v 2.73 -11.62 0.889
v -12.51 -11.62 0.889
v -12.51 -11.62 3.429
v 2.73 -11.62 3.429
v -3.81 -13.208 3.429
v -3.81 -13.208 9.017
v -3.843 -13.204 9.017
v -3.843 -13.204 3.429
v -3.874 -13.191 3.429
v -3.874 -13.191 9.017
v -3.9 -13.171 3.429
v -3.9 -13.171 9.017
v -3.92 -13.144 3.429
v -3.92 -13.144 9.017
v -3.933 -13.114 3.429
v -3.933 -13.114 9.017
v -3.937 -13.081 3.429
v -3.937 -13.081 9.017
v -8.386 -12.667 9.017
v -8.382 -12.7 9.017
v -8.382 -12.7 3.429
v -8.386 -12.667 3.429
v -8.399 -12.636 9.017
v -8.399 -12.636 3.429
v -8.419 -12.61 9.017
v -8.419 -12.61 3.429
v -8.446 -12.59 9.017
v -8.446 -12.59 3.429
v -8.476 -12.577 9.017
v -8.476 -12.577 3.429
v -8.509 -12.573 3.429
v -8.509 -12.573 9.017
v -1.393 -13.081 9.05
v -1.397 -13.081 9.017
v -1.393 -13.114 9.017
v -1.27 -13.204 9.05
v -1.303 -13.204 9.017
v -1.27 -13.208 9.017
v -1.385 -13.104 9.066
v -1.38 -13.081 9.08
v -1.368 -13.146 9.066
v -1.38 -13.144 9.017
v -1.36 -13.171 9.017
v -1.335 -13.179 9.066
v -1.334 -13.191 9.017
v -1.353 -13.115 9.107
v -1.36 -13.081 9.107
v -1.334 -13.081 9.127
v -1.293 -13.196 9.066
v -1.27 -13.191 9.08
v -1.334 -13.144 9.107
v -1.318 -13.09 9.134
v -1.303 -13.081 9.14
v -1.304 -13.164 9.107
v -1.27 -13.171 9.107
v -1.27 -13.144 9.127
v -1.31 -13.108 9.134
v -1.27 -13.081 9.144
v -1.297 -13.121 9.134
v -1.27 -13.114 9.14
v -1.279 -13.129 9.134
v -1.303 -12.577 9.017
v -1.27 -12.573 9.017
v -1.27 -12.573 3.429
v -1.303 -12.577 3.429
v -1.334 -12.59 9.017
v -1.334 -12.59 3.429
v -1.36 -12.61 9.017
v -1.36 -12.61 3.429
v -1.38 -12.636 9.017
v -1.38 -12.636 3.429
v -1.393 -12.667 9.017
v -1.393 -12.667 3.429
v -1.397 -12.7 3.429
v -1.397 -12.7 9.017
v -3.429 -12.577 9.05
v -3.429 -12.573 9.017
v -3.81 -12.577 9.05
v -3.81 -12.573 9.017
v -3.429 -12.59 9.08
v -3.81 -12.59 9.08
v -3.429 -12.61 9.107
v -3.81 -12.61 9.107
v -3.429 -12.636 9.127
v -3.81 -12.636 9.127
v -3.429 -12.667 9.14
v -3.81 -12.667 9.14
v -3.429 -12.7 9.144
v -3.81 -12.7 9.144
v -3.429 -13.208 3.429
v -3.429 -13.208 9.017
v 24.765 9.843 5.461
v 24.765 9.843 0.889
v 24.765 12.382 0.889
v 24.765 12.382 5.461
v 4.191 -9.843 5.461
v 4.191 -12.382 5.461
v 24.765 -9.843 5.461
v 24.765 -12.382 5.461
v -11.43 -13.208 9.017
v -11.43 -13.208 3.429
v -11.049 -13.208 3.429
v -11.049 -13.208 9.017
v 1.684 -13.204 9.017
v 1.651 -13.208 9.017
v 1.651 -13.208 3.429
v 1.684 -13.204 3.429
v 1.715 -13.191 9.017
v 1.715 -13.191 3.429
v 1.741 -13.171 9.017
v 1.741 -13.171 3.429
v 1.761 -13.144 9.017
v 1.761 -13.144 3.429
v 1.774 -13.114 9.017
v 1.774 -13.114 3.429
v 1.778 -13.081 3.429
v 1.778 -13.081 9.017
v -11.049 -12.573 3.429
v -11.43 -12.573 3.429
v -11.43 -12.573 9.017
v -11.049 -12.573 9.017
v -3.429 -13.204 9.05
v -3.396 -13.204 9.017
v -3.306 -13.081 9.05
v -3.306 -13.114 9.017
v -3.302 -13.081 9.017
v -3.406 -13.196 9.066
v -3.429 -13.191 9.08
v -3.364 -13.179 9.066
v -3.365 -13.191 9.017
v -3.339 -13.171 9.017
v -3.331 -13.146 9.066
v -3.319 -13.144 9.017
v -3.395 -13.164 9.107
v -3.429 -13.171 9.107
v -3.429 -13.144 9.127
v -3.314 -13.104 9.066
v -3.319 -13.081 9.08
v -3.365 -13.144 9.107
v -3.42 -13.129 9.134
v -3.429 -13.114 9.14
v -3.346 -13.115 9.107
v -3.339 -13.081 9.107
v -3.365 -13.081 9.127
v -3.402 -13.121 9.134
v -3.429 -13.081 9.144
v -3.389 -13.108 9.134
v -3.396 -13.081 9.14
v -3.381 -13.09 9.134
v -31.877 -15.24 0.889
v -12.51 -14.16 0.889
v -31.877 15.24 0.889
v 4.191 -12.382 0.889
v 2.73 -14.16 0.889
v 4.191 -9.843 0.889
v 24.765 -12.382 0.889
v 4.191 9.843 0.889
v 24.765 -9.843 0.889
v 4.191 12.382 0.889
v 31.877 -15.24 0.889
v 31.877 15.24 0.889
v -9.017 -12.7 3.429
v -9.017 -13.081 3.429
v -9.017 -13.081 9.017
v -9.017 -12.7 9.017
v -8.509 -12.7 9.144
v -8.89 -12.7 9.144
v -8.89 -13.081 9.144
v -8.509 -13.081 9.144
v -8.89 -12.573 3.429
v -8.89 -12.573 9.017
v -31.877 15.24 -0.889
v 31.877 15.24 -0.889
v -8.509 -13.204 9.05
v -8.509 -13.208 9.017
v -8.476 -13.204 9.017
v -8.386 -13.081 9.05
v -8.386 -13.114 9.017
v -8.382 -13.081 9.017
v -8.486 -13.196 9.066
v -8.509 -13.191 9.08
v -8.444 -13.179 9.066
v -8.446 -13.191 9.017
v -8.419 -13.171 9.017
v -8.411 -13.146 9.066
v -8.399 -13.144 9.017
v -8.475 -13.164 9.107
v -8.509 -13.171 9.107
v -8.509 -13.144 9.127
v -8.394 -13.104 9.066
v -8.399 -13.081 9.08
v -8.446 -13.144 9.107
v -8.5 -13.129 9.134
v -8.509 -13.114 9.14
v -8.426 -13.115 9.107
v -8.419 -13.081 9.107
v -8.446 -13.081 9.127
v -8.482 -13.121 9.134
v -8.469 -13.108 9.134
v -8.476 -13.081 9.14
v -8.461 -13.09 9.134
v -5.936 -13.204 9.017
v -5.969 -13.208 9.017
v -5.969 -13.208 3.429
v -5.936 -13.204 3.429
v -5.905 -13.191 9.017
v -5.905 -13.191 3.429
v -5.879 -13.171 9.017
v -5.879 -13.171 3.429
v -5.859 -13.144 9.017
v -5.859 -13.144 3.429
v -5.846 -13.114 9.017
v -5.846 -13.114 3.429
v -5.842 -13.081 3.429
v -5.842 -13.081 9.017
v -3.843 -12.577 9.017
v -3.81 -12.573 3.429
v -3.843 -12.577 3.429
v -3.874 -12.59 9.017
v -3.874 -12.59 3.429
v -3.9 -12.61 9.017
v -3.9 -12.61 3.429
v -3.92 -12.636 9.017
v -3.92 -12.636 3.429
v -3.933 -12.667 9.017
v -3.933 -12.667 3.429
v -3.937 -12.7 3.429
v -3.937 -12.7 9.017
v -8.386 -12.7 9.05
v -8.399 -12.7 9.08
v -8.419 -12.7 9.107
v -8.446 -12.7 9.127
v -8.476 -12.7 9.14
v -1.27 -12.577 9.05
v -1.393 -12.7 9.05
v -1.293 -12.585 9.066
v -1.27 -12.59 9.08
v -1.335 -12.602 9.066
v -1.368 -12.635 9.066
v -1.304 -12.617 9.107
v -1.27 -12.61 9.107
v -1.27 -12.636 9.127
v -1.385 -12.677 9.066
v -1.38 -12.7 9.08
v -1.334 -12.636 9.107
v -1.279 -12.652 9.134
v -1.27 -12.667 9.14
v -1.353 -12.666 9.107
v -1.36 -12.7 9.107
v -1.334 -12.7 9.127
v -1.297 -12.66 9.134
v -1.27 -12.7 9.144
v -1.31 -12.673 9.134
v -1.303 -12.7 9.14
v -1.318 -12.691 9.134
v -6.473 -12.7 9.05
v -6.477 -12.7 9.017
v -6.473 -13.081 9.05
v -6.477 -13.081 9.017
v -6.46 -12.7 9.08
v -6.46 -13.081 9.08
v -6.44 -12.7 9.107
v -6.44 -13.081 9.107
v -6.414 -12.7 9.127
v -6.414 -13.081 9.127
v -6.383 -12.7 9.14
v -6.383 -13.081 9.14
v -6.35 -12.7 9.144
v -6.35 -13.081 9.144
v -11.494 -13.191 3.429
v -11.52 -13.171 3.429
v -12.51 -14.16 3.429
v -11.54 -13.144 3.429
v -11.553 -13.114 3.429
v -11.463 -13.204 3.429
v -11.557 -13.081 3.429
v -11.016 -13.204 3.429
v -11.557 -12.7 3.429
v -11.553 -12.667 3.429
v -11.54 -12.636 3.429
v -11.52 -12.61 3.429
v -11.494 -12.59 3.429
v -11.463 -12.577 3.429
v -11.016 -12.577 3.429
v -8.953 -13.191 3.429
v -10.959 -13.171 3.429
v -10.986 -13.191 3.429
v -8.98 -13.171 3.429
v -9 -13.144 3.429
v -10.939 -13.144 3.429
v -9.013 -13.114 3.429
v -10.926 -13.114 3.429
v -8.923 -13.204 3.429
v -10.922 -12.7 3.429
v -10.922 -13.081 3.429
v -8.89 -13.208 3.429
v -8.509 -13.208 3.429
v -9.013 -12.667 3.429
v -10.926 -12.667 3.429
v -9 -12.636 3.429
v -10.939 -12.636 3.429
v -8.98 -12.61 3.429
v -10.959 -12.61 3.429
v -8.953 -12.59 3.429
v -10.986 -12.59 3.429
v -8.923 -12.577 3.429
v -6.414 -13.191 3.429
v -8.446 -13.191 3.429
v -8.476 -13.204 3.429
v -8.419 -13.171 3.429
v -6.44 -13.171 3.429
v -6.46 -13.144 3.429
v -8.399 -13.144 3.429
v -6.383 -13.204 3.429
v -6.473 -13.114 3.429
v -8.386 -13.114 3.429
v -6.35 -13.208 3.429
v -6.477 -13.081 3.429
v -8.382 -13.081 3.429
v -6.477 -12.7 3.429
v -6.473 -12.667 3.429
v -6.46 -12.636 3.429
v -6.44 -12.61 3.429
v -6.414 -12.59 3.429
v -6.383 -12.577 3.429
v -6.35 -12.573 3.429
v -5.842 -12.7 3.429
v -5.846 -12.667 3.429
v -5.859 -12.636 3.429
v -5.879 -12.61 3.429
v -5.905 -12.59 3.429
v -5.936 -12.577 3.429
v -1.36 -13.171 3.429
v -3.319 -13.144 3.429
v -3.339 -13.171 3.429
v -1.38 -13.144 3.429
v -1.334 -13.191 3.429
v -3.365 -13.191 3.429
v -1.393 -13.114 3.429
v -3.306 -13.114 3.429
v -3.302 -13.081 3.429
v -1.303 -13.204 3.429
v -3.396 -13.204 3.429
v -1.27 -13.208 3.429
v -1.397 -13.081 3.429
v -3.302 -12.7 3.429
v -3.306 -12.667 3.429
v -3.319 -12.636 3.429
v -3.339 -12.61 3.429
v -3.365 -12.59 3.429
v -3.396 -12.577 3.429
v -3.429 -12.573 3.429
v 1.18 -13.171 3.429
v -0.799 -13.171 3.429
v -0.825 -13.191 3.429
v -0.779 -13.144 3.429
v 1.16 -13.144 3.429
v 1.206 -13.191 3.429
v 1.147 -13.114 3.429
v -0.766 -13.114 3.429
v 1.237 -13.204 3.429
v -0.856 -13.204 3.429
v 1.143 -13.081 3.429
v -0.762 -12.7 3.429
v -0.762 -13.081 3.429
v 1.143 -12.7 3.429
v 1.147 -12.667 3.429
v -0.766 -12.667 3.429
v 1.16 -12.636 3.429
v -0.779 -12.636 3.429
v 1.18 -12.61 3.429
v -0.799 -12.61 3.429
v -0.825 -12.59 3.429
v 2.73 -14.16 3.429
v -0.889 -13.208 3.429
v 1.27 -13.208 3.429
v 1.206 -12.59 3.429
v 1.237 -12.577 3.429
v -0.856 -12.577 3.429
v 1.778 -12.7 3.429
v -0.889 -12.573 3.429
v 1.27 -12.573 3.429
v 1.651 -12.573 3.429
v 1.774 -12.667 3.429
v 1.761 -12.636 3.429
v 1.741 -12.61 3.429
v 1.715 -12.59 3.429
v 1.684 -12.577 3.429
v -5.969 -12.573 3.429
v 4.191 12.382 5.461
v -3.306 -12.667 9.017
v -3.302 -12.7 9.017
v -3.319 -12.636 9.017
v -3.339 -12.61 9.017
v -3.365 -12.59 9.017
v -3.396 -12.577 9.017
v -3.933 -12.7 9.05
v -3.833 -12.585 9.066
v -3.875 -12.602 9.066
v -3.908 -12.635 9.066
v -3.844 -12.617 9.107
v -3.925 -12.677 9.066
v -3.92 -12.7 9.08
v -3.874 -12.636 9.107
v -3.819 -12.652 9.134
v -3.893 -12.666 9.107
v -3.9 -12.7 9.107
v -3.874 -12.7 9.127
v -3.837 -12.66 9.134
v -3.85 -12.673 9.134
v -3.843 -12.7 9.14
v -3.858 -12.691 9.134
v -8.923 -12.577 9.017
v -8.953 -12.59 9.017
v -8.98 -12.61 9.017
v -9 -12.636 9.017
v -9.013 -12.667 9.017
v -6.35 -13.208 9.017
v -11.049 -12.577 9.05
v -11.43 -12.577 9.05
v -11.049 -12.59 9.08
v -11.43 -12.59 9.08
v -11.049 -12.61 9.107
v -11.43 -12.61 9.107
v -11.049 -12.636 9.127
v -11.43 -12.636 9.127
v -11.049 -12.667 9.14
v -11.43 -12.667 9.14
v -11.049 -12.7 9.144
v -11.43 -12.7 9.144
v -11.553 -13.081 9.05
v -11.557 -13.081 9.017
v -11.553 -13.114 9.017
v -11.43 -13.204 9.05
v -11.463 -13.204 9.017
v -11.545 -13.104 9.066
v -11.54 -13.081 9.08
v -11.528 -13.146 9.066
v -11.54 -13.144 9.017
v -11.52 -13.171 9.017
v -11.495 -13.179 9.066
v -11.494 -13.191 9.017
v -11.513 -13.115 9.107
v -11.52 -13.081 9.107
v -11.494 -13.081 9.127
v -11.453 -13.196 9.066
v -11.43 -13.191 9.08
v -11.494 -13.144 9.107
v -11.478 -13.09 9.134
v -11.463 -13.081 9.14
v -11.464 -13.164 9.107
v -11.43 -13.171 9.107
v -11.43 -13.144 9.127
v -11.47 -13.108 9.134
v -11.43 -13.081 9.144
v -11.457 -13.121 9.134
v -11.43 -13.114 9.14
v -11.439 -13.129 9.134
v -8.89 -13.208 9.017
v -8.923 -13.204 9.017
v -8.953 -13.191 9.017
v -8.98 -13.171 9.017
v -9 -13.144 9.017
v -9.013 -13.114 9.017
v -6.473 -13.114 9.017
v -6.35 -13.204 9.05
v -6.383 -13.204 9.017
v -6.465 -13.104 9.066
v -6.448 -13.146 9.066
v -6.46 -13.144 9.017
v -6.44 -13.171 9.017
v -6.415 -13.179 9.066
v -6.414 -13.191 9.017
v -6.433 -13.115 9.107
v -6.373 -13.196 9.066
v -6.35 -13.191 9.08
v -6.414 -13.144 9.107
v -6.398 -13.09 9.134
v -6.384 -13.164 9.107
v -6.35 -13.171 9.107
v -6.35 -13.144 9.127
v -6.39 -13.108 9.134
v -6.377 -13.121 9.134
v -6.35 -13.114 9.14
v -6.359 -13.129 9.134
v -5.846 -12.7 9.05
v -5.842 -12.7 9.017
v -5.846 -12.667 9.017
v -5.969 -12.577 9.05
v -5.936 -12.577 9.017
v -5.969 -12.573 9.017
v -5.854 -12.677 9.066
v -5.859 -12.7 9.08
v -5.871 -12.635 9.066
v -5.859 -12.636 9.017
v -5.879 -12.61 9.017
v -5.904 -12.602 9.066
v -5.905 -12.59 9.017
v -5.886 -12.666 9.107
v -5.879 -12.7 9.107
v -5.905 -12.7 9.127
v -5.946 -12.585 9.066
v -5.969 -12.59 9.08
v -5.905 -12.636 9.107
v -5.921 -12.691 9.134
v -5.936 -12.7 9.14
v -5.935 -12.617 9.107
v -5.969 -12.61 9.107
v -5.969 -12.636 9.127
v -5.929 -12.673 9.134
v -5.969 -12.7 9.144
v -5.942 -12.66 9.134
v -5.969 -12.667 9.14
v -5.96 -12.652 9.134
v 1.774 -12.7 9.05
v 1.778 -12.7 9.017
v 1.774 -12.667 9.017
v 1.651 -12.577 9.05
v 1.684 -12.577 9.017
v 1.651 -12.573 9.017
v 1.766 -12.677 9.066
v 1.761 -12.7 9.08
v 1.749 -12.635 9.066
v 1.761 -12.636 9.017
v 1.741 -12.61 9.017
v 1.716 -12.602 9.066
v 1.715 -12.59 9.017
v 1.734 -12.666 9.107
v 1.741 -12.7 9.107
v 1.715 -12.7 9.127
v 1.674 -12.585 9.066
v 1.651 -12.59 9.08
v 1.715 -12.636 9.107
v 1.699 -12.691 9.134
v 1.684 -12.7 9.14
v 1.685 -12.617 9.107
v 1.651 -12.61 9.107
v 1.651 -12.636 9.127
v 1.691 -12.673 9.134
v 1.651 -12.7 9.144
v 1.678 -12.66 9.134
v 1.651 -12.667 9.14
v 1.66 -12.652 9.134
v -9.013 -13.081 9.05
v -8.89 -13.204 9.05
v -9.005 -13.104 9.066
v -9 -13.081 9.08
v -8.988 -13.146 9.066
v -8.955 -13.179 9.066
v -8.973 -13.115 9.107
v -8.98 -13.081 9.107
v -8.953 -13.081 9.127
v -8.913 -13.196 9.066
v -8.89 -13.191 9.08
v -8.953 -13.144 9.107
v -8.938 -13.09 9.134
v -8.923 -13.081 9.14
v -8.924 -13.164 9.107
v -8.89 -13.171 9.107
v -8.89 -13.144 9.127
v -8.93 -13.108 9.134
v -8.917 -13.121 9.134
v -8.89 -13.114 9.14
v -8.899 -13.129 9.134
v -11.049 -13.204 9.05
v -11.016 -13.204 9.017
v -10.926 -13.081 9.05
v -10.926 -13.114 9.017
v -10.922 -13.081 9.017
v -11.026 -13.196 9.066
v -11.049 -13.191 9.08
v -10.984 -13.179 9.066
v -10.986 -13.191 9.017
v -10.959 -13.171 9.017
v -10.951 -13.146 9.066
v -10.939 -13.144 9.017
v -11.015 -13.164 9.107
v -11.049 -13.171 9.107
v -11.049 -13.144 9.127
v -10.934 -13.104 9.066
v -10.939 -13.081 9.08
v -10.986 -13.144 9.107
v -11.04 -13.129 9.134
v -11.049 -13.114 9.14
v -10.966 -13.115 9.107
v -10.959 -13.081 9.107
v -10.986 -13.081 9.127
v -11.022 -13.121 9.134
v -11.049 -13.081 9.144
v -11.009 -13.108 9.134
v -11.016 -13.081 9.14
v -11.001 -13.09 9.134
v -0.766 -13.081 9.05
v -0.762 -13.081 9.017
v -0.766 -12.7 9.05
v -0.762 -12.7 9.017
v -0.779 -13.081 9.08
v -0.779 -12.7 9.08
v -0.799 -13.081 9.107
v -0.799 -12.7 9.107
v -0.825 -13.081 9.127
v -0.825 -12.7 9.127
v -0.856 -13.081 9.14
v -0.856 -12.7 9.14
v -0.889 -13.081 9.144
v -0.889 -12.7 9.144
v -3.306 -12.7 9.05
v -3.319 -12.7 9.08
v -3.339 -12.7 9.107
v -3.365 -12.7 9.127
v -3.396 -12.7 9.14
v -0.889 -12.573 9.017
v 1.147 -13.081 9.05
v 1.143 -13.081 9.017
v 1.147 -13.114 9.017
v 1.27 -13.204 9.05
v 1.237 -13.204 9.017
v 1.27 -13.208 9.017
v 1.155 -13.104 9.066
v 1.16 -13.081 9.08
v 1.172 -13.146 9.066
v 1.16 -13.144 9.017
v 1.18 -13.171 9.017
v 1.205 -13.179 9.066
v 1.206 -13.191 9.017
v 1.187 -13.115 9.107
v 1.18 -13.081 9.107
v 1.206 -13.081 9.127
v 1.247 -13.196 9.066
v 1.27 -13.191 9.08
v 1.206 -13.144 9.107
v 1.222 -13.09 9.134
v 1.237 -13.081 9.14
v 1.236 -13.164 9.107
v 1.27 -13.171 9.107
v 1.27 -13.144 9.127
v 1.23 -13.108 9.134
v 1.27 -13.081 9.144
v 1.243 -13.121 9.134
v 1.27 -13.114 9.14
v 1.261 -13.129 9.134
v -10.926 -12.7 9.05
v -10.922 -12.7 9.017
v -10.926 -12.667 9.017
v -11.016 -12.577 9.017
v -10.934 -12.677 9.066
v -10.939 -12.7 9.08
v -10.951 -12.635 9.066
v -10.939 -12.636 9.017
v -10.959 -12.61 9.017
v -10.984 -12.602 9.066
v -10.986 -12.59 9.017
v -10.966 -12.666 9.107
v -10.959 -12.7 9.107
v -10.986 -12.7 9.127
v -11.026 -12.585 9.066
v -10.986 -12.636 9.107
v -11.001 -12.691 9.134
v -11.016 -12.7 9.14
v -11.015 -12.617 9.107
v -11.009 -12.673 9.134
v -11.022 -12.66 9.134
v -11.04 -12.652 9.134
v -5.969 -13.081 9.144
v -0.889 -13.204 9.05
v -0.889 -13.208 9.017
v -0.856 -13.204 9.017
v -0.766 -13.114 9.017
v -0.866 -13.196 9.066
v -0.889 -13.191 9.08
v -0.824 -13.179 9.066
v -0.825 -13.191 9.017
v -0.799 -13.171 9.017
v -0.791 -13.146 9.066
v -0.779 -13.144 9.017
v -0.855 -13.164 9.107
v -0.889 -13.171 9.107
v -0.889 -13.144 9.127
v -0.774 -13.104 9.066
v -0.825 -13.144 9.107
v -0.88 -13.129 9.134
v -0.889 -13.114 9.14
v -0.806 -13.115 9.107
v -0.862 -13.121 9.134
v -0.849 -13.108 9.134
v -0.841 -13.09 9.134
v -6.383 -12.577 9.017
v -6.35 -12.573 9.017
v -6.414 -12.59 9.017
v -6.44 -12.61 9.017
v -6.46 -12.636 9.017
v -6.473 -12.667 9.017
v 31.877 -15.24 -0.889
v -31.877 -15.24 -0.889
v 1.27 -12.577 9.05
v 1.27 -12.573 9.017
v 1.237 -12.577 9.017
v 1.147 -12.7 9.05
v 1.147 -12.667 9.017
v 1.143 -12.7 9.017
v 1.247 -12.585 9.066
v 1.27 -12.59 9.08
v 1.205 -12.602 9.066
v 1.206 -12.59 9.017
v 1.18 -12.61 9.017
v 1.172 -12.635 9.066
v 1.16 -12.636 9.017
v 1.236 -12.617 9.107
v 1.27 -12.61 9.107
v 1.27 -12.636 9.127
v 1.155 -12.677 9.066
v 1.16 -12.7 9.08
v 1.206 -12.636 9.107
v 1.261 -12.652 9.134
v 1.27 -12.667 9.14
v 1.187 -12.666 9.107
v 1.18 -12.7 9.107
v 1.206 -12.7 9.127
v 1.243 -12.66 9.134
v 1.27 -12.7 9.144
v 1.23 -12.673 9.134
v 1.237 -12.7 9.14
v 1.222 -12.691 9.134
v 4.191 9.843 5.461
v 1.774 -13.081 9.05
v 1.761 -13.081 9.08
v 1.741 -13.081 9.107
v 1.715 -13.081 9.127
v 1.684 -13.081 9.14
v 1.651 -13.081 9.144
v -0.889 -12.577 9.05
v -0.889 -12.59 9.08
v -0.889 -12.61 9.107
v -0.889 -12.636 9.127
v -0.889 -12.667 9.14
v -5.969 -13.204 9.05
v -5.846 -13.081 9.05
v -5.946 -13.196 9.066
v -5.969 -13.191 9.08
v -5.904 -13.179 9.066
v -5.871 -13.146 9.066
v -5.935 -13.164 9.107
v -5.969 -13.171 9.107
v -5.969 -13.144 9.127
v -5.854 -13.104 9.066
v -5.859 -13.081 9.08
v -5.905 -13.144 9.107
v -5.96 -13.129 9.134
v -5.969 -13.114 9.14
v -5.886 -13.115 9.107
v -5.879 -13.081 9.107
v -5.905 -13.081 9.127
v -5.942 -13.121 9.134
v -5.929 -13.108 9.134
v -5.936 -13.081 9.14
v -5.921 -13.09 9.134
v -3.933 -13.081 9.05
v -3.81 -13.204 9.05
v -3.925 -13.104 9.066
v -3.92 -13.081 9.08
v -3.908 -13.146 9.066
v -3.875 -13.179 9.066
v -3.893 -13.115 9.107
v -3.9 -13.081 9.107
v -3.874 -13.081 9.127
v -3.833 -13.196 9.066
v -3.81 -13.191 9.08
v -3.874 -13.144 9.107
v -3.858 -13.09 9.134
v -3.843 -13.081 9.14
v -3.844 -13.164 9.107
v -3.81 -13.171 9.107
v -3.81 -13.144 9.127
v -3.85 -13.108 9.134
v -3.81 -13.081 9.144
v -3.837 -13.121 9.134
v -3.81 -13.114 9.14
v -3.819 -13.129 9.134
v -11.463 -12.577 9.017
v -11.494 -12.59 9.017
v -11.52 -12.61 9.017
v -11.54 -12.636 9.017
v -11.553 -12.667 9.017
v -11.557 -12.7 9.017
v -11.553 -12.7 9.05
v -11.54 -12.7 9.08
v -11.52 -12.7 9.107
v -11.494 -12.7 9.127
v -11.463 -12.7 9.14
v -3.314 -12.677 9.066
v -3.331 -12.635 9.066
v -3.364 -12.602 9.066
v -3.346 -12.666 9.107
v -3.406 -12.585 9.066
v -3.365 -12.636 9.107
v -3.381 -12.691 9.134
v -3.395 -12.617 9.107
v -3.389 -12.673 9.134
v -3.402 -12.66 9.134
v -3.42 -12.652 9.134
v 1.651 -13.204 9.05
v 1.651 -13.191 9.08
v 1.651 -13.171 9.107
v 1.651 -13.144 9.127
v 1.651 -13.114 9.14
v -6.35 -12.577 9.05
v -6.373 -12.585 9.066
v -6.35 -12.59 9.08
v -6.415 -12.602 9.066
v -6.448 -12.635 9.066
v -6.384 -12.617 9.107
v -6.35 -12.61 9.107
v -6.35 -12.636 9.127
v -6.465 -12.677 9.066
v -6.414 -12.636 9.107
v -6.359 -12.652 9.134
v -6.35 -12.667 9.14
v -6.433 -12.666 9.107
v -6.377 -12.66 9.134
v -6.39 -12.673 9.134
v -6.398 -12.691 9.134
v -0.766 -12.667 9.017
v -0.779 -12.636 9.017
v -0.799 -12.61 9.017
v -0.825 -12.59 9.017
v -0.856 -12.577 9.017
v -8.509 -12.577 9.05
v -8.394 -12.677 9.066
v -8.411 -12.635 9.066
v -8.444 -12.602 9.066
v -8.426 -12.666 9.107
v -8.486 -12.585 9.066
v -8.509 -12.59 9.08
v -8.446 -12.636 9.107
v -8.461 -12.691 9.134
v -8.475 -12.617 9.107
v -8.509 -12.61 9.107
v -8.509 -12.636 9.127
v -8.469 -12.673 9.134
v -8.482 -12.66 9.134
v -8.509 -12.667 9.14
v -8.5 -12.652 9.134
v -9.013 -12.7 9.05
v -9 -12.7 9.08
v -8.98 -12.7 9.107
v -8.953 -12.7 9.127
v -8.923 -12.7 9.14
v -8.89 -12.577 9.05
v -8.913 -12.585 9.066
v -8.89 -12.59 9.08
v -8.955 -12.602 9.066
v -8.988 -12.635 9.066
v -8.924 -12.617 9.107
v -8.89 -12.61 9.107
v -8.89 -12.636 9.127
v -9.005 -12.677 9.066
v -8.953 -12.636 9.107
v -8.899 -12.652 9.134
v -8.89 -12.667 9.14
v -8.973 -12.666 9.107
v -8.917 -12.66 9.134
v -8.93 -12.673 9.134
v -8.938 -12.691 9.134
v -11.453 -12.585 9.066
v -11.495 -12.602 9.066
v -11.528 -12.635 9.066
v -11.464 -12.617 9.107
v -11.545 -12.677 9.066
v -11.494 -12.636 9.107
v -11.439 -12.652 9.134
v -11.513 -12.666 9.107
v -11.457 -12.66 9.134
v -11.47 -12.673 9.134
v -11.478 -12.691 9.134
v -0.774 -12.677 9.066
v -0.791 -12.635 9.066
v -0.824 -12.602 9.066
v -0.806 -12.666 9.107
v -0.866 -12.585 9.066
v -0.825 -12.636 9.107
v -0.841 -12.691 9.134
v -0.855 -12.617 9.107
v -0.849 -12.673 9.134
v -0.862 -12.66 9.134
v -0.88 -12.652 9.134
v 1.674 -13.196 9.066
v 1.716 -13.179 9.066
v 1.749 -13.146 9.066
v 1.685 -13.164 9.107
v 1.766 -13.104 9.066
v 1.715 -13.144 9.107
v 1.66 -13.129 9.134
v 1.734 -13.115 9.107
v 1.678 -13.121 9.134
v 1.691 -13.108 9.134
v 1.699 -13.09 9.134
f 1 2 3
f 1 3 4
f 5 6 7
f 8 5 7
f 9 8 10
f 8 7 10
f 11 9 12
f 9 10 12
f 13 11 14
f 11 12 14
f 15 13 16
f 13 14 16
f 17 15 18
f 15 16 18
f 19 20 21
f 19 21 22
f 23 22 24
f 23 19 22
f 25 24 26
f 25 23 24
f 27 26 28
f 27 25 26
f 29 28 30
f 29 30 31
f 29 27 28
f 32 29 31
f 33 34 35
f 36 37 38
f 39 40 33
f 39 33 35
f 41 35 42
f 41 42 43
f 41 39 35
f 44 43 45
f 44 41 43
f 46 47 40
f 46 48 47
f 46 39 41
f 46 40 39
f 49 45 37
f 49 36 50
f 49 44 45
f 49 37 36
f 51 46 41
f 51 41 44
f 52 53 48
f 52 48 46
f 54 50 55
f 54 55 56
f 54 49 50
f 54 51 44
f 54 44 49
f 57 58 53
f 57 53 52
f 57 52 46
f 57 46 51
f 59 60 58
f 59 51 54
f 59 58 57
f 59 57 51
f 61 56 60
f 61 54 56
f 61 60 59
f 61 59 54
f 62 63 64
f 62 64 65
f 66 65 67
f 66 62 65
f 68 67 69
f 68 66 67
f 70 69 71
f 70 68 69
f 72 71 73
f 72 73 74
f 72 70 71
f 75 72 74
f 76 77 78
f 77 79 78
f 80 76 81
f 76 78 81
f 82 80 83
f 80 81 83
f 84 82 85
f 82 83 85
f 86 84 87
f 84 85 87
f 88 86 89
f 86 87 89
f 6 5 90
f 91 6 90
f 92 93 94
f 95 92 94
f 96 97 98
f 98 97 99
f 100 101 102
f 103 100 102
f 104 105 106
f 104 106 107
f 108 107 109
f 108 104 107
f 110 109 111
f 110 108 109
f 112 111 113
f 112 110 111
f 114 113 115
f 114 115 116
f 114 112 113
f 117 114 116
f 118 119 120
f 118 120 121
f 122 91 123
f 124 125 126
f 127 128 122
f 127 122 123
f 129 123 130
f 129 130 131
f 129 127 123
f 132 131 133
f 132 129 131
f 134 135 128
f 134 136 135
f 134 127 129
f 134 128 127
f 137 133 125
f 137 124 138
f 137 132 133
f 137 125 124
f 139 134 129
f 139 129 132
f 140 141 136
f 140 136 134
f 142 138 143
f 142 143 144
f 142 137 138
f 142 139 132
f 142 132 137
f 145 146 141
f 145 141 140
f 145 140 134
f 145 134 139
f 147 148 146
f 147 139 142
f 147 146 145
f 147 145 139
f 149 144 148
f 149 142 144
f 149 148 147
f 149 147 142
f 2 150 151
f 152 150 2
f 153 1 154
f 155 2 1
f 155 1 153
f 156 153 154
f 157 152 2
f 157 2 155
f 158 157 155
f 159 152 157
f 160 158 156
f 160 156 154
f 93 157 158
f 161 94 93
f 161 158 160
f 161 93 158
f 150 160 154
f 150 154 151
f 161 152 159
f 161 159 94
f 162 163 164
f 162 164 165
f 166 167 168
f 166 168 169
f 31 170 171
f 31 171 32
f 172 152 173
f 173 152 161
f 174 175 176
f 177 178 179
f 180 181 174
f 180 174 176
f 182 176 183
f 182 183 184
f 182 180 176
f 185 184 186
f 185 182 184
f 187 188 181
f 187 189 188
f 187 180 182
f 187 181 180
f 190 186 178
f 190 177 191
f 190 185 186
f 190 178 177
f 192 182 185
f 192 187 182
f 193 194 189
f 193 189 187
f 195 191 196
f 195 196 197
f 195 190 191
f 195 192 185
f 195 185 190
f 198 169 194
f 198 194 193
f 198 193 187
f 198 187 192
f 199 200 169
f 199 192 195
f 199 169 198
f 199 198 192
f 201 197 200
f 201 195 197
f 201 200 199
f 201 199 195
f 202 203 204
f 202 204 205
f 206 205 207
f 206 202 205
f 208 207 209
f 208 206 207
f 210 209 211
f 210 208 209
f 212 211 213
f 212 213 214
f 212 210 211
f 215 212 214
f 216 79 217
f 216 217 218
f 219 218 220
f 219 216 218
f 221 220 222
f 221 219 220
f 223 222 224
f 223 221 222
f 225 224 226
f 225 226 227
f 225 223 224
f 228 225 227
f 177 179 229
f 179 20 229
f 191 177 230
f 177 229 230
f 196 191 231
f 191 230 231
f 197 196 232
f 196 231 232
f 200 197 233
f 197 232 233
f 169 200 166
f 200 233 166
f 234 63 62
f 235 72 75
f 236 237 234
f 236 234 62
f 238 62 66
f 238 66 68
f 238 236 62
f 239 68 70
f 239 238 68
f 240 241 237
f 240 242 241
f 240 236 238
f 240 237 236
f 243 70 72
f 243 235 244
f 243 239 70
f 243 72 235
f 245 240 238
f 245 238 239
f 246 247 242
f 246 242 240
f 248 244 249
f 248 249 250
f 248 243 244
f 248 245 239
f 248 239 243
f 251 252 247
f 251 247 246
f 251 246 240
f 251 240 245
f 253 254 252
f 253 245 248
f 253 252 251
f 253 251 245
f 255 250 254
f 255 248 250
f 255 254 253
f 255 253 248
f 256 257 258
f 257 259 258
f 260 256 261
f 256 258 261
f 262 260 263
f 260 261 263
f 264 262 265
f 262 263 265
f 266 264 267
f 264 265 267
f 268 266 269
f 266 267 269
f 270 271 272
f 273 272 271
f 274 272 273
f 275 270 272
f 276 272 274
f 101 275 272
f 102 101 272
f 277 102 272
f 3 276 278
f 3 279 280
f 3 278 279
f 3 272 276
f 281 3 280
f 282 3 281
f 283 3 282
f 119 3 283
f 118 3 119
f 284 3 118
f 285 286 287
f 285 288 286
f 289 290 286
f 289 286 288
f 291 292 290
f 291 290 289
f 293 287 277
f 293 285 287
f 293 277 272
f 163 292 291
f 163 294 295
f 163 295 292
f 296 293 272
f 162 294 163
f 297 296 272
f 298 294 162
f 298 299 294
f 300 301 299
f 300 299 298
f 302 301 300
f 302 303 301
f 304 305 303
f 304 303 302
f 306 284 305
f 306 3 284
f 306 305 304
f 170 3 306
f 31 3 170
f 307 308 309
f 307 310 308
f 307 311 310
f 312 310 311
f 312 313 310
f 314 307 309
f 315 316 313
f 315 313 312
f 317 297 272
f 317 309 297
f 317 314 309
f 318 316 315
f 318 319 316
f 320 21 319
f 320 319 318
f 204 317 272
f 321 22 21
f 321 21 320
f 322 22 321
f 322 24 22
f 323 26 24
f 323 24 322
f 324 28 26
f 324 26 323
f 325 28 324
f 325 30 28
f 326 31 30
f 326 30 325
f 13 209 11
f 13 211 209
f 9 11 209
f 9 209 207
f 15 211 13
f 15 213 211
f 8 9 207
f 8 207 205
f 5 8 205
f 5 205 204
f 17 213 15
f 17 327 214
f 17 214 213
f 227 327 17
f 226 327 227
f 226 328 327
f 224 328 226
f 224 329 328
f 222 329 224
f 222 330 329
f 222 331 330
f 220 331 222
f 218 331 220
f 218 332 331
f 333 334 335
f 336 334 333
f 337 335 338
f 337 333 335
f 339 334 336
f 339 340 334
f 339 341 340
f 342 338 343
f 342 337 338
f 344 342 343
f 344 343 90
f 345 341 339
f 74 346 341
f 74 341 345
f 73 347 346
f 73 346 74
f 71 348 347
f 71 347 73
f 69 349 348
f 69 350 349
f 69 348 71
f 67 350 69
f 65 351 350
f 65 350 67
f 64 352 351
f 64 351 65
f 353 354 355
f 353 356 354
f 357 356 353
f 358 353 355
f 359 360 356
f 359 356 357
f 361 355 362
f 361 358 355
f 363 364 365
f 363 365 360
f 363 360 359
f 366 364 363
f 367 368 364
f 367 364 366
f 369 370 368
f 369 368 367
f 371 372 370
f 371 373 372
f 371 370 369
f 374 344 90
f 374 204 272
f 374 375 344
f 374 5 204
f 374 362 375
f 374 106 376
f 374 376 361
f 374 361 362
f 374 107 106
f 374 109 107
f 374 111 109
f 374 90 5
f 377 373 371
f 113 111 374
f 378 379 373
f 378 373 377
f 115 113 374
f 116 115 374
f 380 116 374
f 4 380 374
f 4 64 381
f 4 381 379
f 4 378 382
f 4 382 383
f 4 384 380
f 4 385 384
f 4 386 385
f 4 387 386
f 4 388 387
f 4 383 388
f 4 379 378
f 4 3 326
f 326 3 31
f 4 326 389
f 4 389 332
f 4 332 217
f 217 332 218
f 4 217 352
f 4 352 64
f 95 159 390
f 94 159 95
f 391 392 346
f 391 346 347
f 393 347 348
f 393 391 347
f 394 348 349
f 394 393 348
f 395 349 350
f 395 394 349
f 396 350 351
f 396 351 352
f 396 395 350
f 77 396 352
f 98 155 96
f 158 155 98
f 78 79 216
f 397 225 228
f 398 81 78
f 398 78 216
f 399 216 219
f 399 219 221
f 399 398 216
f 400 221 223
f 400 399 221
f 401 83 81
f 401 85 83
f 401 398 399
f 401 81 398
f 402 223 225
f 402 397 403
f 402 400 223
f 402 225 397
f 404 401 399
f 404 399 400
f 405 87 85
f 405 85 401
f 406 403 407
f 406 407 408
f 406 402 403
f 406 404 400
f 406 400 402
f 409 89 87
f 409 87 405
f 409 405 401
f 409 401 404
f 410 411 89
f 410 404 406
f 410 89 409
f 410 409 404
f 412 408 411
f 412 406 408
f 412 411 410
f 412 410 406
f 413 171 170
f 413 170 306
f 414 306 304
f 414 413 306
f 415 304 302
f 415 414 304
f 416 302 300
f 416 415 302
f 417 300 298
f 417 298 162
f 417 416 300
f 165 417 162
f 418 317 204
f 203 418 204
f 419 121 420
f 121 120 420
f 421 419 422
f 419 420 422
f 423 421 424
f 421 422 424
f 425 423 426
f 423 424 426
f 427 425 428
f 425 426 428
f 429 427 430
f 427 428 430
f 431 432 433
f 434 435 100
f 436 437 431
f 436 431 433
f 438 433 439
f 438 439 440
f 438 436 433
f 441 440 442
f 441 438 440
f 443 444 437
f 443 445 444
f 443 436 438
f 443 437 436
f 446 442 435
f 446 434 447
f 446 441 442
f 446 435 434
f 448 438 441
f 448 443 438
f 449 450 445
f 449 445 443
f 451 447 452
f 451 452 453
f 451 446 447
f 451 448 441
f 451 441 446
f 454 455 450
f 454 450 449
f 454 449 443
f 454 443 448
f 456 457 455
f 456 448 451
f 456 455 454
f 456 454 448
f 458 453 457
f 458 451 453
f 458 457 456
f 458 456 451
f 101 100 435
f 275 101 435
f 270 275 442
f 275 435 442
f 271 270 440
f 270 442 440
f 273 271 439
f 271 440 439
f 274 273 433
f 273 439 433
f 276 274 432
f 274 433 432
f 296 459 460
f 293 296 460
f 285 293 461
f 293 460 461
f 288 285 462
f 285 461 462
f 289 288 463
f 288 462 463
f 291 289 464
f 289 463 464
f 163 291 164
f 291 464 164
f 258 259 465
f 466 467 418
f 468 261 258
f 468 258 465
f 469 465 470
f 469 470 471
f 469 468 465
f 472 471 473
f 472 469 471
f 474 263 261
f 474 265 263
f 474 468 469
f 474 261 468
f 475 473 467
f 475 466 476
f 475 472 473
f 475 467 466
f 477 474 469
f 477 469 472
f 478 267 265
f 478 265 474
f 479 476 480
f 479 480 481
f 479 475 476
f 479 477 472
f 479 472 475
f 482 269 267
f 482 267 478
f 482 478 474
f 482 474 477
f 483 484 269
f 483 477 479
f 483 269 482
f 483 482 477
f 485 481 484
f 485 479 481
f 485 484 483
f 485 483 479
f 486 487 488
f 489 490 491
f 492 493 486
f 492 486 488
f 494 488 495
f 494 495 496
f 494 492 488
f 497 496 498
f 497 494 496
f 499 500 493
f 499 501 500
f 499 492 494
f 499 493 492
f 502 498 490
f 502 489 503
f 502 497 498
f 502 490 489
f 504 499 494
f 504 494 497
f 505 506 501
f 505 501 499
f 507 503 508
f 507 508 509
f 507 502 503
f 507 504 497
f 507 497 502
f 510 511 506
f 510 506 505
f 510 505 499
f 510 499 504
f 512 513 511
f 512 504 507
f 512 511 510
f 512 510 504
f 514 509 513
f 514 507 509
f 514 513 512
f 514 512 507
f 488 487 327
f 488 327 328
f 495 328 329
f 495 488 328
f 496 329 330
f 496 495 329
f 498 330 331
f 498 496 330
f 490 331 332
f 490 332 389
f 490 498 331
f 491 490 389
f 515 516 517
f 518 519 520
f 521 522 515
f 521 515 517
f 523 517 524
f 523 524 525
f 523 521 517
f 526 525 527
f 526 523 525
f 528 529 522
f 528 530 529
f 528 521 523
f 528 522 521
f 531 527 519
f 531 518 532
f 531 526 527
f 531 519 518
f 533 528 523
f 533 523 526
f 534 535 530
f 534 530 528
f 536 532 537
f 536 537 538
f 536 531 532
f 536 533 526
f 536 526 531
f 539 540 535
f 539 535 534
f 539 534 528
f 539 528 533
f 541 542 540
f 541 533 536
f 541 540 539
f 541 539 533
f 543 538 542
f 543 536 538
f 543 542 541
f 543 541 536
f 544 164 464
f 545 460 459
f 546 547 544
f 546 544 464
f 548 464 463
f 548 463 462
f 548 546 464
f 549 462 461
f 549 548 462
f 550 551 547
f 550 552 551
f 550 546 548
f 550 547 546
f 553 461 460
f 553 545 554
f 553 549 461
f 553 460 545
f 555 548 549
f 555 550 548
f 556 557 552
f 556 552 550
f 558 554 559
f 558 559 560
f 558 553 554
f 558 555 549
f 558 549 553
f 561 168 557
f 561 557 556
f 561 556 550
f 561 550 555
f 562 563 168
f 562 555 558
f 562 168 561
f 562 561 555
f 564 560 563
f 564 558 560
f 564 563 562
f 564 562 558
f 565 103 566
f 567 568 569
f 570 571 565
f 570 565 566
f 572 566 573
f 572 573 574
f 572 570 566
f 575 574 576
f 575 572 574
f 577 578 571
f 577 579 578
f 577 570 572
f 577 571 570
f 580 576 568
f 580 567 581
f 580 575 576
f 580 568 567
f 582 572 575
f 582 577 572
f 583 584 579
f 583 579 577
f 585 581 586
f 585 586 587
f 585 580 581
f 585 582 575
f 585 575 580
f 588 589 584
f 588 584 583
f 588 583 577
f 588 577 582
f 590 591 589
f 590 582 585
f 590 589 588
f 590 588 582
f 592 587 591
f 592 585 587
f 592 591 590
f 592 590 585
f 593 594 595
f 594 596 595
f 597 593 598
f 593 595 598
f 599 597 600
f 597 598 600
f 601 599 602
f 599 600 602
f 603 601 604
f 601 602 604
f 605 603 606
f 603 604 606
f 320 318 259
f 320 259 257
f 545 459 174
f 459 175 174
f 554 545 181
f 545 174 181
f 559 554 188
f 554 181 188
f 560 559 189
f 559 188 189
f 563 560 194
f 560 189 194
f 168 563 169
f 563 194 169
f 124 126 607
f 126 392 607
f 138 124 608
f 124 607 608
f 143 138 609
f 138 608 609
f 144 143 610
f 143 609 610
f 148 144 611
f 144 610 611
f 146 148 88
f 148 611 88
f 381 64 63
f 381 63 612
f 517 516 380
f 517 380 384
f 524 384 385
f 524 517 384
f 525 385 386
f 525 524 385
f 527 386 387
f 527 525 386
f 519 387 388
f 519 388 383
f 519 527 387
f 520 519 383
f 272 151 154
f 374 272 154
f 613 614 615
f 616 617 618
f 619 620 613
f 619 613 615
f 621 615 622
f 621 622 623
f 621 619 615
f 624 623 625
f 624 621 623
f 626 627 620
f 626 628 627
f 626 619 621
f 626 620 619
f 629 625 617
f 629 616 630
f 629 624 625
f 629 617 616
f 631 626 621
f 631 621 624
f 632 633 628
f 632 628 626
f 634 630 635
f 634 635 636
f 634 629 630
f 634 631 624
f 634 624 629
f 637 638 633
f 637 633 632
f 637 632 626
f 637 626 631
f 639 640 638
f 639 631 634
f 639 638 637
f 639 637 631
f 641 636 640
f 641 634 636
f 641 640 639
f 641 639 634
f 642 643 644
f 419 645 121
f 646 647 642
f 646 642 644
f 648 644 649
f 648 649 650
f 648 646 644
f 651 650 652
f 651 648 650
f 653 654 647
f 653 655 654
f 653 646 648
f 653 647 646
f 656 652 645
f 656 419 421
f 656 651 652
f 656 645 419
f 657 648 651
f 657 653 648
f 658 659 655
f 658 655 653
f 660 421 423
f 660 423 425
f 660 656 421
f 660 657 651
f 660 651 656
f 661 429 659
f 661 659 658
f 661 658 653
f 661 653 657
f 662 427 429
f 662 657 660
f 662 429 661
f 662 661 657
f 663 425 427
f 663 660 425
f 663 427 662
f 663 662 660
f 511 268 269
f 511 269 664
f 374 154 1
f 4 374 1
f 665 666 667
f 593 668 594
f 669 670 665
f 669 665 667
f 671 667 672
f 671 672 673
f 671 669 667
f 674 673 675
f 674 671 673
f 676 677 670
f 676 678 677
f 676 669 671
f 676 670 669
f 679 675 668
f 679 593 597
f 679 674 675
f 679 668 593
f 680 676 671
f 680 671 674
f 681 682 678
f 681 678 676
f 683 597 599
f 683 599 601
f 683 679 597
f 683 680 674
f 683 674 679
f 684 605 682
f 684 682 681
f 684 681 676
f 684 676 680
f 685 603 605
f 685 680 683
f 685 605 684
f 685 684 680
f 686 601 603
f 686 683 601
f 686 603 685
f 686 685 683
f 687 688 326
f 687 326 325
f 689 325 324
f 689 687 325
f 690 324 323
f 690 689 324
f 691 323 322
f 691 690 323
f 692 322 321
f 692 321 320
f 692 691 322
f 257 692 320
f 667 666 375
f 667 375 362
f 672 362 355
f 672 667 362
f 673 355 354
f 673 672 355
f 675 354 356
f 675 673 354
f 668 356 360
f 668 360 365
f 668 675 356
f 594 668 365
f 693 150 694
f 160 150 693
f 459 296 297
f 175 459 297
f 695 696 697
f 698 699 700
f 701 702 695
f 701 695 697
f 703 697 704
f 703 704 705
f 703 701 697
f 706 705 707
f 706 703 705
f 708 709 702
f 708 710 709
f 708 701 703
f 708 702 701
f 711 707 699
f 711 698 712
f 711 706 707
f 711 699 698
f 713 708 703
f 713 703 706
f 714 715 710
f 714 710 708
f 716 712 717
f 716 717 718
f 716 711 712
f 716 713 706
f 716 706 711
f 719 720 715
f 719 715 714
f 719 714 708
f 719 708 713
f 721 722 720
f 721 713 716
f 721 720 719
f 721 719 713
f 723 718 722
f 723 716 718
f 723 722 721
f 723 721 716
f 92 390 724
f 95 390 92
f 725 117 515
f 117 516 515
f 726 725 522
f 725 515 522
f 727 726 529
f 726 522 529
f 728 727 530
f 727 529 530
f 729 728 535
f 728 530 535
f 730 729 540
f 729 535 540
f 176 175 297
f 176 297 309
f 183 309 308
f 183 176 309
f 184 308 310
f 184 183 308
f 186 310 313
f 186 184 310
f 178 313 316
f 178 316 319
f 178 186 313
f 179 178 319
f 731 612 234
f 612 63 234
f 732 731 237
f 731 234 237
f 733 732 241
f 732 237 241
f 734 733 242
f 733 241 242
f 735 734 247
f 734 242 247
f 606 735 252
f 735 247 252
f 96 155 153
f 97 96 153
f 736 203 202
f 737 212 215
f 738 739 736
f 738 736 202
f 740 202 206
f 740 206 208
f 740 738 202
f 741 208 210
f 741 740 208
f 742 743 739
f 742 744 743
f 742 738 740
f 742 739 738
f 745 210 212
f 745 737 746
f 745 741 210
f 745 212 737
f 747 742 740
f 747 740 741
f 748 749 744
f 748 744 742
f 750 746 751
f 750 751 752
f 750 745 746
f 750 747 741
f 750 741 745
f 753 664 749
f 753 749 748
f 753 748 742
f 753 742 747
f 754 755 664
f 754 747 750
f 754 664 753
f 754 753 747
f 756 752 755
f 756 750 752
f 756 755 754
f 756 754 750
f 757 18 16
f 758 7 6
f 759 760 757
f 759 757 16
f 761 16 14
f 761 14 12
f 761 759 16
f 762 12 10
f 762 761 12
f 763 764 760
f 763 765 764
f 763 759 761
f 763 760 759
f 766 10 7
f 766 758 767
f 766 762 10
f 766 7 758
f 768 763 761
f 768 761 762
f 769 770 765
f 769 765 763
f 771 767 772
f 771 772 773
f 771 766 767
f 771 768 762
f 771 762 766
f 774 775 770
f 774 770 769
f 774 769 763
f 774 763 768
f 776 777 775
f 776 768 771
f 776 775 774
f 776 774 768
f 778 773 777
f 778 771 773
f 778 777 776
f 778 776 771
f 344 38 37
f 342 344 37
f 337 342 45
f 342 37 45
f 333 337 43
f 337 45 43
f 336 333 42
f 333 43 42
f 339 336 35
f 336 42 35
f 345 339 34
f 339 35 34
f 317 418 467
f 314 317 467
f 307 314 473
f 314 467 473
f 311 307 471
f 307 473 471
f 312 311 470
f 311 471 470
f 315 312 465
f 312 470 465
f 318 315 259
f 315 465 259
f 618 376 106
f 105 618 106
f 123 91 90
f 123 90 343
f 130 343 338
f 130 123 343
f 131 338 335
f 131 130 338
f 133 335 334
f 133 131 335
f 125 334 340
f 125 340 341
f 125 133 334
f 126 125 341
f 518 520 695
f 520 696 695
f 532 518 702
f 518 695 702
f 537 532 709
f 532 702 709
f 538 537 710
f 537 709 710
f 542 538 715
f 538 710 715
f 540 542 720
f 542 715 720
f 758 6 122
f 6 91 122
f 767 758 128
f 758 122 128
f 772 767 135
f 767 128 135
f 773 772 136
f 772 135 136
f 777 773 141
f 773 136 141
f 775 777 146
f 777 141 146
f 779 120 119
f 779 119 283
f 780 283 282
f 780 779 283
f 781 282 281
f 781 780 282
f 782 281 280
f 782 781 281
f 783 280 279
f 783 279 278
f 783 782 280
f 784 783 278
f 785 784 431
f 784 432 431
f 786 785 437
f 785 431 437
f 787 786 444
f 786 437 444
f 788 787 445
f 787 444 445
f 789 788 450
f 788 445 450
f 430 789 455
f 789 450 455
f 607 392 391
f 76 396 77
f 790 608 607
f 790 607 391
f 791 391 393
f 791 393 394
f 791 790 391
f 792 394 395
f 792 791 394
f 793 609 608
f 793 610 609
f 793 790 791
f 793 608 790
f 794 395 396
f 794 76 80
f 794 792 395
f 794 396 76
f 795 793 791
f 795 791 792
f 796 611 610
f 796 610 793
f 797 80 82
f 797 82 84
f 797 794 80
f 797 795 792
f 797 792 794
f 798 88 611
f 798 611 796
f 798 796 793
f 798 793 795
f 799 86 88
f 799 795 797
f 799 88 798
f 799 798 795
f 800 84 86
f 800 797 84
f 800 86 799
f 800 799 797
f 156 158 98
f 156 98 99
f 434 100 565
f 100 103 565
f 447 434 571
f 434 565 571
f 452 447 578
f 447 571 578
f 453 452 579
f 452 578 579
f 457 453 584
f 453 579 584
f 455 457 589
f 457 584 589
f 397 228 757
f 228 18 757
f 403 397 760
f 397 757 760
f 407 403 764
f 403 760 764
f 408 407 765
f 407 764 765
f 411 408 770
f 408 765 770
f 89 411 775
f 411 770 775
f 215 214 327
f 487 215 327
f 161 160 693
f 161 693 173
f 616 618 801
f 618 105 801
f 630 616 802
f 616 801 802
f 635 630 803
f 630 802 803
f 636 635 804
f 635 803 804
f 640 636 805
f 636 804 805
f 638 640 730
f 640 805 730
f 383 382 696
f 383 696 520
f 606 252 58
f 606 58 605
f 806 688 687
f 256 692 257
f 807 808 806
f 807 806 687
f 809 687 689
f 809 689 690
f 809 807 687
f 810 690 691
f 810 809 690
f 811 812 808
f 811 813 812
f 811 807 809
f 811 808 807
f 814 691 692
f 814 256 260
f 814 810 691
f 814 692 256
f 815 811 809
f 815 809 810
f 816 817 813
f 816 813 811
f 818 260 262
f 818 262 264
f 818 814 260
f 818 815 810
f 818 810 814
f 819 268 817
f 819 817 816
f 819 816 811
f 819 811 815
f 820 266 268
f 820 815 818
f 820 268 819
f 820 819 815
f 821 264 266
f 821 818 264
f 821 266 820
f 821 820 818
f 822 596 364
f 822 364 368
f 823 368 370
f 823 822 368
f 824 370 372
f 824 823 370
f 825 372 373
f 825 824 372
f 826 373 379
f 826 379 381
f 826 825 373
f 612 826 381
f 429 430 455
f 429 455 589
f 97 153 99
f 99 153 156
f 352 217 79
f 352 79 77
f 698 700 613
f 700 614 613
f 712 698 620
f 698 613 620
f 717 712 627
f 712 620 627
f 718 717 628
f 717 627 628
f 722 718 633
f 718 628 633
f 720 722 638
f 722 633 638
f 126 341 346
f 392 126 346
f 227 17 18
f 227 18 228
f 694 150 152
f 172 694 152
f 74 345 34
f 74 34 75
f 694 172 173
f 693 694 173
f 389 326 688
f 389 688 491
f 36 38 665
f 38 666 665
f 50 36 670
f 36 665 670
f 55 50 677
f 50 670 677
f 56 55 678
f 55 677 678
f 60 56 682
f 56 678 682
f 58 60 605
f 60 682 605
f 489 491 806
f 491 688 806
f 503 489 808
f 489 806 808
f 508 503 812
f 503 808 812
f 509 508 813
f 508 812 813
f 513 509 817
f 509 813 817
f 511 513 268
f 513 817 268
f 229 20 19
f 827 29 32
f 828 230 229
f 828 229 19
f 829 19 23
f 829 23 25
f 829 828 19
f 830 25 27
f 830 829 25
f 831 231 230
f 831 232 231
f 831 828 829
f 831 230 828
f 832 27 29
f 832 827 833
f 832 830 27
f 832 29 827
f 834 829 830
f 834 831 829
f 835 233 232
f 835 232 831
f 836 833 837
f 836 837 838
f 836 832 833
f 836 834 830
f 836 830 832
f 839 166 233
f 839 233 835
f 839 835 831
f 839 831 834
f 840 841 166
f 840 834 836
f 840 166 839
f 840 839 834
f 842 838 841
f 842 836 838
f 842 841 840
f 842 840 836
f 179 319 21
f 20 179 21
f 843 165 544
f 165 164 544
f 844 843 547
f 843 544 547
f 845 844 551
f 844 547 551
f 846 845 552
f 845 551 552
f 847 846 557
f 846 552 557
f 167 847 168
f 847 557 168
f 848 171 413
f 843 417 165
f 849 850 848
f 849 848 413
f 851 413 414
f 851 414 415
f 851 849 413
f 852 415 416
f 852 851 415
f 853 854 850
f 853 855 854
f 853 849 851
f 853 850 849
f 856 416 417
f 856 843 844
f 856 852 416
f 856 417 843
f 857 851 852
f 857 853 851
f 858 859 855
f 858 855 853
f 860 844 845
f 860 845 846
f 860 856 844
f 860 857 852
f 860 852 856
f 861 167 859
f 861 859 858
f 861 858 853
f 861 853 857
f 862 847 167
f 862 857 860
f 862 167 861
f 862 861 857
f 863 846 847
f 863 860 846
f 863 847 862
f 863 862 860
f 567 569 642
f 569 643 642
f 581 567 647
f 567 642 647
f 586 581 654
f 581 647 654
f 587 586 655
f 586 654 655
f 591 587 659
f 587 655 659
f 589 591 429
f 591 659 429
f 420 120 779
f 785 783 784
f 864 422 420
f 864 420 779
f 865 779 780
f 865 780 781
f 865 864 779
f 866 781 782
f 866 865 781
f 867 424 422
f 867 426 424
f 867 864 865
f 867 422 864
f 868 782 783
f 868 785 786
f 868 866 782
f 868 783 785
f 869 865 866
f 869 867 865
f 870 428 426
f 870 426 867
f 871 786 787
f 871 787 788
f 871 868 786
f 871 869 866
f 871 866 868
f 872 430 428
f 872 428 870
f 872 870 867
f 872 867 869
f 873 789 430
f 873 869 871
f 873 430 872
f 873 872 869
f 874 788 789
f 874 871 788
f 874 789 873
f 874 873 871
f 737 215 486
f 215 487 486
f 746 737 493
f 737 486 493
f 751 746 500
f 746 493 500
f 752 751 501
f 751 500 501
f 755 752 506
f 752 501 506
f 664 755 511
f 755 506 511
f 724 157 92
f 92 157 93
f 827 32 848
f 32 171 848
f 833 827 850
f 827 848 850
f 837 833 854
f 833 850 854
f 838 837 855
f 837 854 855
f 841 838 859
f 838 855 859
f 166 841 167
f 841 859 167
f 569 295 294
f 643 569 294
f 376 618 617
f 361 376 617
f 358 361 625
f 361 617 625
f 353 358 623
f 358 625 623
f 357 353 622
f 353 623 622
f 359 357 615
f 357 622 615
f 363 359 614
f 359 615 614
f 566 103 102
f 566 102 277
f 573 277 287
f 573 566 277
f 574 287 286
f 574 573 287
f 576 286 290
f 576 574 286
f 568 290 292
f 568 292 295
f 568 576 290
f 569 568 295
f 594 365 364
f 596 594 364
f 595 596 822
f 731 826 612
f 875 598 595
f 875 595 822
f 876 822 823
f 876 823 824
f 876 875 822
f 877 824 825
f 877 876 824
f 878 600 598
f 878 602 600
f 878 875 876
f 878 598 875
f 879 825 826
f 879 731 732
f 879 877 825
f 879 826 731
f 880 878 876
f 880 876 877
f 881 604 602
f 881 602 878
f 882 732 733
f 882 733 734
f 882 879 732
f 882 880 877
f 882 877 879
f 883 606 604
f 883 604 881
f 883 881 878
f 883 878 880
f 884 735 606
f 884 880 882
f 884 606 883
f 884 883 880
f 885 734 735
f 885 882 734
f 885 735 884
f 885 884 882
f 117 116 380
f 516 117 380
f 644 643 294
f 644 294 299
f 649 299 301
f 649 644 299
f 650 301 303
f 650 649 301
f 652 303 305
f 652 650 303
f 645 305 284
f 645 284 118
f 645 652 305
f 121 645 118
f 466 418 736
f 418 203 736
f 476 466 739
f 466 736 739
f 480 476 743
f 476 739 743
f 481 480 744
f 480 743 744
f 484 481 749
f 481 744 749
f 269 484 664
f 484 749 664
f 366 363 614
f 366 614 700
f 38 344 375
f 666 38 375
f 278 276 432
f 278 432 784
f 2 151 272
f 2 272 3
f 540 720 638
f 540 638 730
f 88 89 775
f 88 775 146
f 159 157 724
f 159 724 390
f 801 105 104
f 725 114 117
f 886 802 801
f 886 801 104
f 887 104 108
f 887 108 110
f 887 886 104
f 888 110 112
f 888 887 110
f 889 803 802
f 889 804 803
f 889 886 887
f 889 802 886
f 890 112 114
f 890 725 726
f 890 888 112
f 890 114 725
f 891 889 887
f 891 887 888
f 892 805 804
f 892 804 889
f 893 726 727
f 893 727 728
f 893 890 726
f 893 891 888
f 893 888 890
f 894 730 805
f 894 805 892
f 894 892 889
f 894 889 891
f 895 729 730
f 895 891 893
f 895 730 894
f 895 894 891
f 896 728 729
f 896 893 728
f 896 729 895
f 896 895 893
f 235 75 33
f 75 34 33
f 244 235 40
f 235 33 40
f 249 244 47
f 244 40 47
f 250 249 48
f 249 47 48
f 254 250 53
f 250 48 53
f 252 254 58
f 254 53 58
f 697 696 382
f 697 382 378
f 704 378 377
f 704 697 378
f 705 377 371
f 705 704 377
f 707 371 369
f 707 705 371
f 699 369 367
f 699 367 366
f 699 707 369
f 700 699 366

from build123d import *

# Parameters (mm, degrees)
SKETCH1_W              = 63.754
SKETCH1_H              = 30.48
BOSS_EXTRUDE1_DEPTH    = 0.889
SKETCH2_W              = 20.574
SKETCH2_H              = 2.54
BOSS_EXTRUDE2_DEPTH    = 4.572
SKETCH3_W              = 0.635
SKETCH3_H              = 0.635
BOSS_EXTRUDE3_DEPTH    = 8.255
FILLET3_R              = 0.127
FILLET4_R              = 0.127
LPATTERN1_COUNT        = 6
LPATTERN1_PITCH        = 2.54
FILLET3_OF_LPATTERN1_R = 0.127
FILLET4_OF_LPATTERN1_R = 0.127
SKETCH4_W              = 15.24
SKETCH4_H              = 2.54
BOSS_EXTRUDE4_DEPTH    = 2.54


with BuildPart() as part:
    # Sketch1 → Boss-Extrude1 (new body, symmetric)
    with BuildSketch(Plane.XY):
        Rectangle(SKETCH1_W, SKETCH1_H)
    extrude(amount=BOSS_EXTRUDE1_DEPTH, both=True)

    # Sketch2 → Boss-Extrude2 (add)
    with BuildSketch(Plane.XY.offset(0.889)):
        with Locations((14.478, 11.1125)):
            Rectangle(SKETCH2_W, SKETCH2_H)
    boss_extrude2 = extrude(amount=BOSS_EXTRUDE2_DEPTH)

    # Mirror1: Boss-Extrude2 across plane
    add(boss_extrude2.mirror(Plane.ZX))

    # Sketch3 → Boss-Extrude3 (add)
    with BuildSketch(Plane.XY.offset(0.889)):
        with Locations((-11.2395, -12.8905)):
            Rectangle(SKETCH3_W, SKETCH3_H)
    boss_extrude3 = extrude(amount=BOSS_EXTRUDE3_DEPTH)

    # Fillet3
    fillet3_edges = [part.edges().sort_by_distance(p)[0] for p in [
        (-10.922, -13.208, 5.0165),
        (-10.922, -12.573, 5.0165),
        (-11.557, -12.573, 5.0165),
        (-11.557, -13.208, 5.0165),
    ]]
    fillet(fillet3_edges, radius=FILLET3_R)

    # Fillet4
    fillet4_edges = [part.edges().sort_by_distance(p)[0] for p in [
        (-10.922, -12.8905, 9.144),
        (-11.2395, -13.208, 9.144),
        (-11.2395, -12.573, 9.144),
        (-11.557, -12.8905, 9.144),
        (-11.519802561, -12.610197439, 9.144),
        (-10.959197439, -12.610197439, 9.144),
        (-11.519802561, -13.170802561, 9.144),
        (-10.959197439, -13.170802561, 9.144),
    ]]
    fillet(fillet4_edges, radius=FILLET4_R)

    # LPattern1: Boss-Extrude3 ×6
    with Locations(*[(i * LPATTERN1_PITCH, 0, 0) for i in range(1, LPATTERN1_COUNT)]):
        add(boss_extrude3)

    # Fillet3 of LPattern1
    fillet3_of_lpattern1_edges = [part.edges().sort_by_distance(p)[0] for p in [
        (-8.382, -13.208, 5.0165),
        (-8.382, -12.573, 5.0165),
        (-9.017, -12.573, 5.0165),
        (-9.017, -13.208, 5.0165),
        (-5.842, -13.208, 5.0165),
        (-5.842, -12.573, 5.0165),
        (-6.477, -12.573, 5.0165),
        (-6.477, -13.208, 5.0165),
        (-3.302, -13.208, 5.0165),
        (-3.302, -12.573, 5.0165),
        (-3.937, -12.573, 5.0165),
        (-3.937, -13.208, 5.0165),
        (-0.762, -13.208, 5.0165),
        (-0.762, -12.573, 5.0165),
        (-1.397, -12.573, 5.0165),
        (-1.397, -13.208, 5.0165),
        (1.778, -13.208, 5.0165),
        (1.778, -12.573, 5.0165),
        (1.143, -12.573, 5.0165),
        (1.143, -13.208, 5.0165),
    ]]
    fillet(fillet3_of_lpattern1_edges, radius=FILLET3_OF_LPATTERN1_R)

    # Fillet4 of LPattern1
    fillet4_of_lpattern1_edges = [part.edges().sort_by_distance(p)[0] for p in [
        (-8.382, -12.8905, 9.144),
        (-8.6995, -13.208, 9.144),
        (-8.6995, -12.573, 9.144),
        (-9.017, -12.8905, 9.144),
        (-8.979802561, -12.610197439, 9.144),
        (-8.419197439, -12.610197439, 9.144),
        (-8.979802561, -13.170802561, 9.144),
        (-8.419197439, -13.170802561, 9.144),
        (-5.842, -12.8905, 9.144),
        (-6.1595, -13.208, 9.144),
        (-6.1595, -12.573, 9.144),
        (-6.477, -12.8905, 9.144),
        (-6.439802561, -12.610197439, 9.144),
        (-5.879197439, -12.610197439, 9.144),
        (-6.439802561, -13.170802561, 9.144),
        (-5.879197439, -13.170802561, 9.144),
        (-3.302, -12.8905, 9.144),
        (-3.6195, -13.208, 9.144),
        (-3.6195, -12.573, 9.144),
        (-3.937, -12.8905, 9.144),
        (-3.899802561, -12.610197439, 9.144),
        (-3.339197439, -12.610197439, 9.144),
        (-3.899802561, -13.170802561, 9.144),
        (-3.339197439, -13.170802561, 9.144),
        (-0.762, -12.8905, 9.144),
        (-1.0795, -13.208, 9.144),
        (-1.0795, -12.573, 9.144),
        (-1.397, -12.8905, 9.144),
        (-1.359802561, -12.610197439, 9.144),
        (-0.799197439, -12.610197439, 9.144),
        (-1.359802561, -13.170802561, 9.144),
        (-0.799197439, -13.170802561, 9.144),
        (1.778, -12.8905, 9.144),
        (1.4605, -13.208, 9.144),
        (1.4605, -12.573, 9.144),
        (1.143, -12.8905, 9.144),
        (1.180197439, -12.610197439, 9.144),
        (1.740802561, -12.610197439, 9.144),
        (1.180197439, -13.170802561, 9.144),
        (1.740802561, -13.170802561, 9.144),
    ]]
    fillet(fillet4_of_lpattern1_edges, radius=FILLET4_OF_LPATTERN1_R)

    # Sketch4 → Boss-Extrude4 (add)
    with BuildSketch(Plane.XY.offset(0.889)):
        with Locations((-4.8895, -12.8905)):
            Rectangle(SKETCH4_W, SKETCH4_H)
    extrude(amount=BOSS_EXTRUDE4_DEPTH)


solid = part.part
